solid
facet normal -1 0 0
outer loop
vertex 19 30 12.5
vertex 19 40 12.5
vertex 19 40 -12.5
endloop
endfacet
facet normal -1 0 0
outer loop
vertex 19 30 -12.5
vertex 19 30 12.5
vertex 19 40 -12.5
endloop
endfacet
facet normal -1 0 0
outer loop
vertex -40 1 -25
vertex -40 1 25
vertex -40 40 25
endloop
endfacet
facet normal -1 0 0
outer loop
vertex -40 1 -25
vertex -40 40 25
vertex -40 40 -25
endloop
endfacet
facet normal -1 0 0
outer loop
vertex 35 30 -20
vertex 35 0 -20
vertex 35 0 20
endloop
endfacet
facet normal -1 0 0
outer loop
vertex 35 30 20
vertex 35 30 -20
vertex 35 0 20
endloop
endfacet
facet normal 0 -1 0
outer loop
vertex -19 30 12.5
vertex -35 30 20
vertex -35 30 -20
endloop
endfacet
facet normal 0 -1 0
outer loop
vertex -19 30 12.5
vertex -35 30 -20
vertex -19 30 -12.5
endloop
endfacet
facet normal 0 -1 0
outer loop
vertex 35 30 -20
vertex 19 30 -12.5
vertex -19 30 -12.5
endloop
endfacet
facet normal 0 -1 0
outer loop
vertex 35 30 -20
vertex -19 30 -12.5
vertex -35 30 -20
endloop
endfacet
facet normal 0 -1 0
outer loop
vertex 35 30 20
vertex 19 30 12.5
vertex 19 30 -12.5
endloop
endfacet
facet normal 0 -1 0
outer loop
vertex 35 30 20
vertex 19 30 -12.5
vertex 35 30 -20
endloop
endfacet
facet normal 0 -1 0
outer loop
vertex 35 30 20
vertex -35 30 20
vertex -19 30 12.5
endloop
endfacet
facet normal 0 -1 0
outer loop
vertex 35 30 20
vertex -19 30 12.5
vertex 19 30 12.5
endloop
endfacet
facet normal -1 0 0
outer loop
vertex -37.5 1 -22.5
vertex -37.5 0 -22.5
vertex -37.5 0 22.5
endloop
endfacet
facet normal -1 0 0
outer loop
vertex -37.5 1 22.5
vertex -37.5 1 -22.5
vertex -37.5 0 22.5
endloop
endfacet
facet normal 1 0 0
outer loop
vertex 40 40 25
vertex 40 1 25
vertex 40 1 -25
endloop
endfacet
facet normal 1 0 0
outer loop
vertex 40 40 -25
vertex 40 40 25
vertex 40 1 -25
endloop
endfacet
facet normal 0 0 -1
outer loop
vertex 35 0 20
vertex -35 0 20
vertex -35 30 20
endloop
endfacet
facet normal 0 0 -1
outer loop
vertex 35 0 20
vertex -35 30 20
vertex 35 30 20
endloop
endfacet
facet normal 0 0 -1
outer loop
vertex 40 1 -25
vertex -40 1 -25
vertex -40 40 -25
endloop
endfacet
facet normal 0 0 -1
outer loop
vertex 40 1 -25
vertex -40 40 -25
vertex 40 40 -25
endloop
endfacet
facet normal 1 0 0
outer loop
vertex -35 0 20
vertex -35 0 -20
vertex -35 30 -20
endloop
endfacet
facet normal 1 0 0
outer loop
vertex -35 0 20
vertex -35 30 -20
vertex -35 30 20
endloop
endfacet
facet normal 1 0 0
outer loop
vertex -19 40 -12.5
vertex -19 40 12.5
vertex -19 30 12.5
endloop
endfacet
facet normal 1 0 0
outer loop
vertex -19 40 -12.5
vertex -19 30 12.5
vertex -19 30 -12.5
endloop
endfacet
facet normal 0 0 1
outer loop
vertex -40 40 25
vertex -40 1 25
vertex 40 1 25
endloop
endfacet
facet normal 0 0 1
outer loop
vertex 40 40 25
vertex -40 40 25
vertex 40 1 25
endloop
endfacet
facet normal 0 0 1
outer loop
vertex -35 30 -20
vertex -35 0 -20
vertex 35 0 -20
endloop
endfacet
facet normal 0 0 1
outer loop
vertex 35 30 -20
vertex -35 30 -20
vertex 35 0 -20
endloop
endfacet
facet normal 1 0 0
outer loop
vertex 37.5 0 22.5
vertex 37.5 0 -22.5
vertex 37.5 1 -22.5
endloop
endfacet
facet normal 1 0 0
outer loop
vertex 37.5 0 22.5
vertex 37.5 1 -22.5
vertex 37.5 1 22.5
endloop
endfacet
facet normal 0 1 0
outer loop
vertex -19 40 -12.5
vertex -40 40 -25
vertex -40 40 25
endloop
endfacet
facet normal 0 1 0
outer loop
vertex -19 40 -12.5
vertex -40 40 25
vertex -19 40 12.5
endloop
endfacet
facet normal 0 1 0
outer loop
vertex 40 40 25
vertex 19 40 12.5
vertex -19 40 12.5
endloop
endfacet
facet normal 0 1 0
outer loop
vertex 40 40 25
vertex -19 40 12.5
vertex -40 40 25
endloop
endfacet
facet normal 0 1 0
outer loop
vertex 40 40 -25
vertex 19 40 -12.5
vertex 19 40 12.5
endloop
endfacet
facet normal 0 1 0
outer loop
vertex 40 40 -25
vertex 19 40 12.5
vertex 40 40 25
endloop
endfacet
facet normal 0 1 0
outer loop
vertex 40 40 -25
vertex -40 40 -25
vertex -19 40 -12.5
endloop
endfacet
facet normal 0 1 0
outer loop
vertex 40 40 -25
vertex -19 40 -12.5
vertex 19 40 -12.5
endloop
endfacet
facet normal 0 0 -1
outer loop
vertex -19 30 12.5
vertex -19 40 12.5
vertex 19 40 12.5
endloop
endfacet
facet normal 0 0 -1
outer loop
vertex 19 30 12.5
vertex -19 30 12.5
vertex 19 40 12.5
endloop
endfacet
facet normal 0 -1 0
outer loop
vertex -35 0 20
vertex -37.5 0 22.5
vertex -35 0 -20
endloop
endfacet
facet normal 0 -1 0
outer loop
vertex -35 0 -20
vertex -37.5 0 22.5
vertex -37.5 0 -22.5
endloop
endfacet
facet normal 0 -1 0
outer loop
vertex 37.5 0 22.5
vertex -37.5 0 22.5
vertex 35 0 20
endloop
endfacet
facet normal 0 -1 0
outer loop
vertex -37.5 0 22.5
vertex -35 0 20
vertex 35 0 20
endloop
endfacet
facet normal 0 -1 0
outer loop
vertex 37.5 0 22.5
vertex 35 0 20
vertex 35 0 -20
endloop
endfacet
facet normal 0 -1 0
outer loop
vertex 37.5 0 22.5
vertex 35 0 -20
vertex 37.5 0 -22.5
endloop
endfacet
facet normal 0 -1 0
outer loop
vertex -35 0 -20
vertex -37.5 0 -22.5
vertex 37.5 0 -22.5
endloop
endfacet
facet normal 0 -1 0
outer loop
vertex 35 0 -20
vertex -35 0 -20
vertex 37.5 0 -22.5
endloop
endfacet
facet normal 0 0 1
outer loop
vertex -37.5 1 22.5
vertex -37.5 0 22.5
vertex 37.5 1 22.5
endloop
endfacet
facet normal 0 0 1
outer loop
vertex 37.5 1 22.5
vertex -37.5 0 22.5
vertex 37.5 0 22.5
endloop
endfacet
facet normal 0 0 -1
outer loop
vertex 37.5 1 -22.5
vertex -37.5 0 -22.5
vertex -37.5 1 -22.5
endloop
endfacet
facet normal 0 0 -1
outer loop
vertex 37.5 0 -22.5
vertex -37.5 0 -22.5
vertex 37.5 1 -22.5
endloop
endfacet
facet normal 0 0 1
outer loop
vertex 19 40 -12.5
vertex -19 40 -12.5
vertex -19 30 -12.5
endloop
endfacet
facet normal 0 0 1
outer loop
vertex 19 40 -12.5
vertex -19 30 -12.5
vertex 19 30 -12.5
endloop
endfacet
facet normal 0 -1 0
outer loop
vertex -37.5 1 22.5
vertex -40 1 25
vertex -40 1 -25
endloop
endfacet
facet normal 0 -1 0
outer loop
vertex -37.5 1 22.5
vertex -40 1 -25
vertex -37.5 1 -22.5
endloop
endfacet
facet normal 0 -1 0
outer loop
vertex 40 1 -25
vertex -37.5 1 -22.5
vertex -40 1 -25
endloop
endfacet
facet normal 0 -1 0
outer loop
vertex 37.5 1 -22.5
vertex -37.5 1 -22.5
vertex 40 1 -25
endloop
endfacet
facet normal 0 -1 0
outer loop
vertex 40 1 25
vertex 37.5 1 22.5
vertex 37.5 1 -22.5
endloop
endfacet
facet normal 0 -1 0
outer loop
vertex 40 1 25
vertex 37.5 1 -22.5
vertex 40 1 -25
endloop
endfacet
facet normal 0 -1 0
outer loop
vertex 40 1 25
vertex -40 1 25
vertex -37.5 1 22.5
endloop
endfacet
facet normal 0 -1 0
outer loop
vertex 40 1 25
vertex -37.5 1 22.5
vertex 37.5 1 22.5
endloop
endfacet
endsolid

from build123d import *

# Parameters (mm, degrees)
SKETCH_1_W          = 80
SKETCH_1_H          = 50
EXTRUDE_1_DEPTH     = 40
SKETCH_2_W          = 70
SKETCH_2_H          = 40
CUT_EXTRUDE_1_DEPTH = 30
SKETCH_4_W          = 38
SKETCH_4_H          = 25
CUT_EXTRUDE_2_DEPTH = 30
SKETCH_7_W          = 80
SKETCH_7_H          = 50
SKETCH_7_W_2        = 75
SKETCH_7_H_2        = 45
CUT_EXTRUDE_3_DEPTH = 1


with BuildPart() as part:
    # 스케치1 → 보스-돌출1 (new body)
    with BuildSketch(Plane(origin=(0, 0, 0), x_dir=(1, 0, 0), z_dir=(0, 1, 0))):
        Rectangle(SKETCH_1_W, SKETCH_1_H)
    extrude(amount=EXTRUDE_1_DEPTH)

    # 스케치2 → 컷-돌출1 (cut)
    with BuildSketch(Plane.XZ):
        Rectangle(SKETCH_2_W, SKETCH_2_H)
    extrude(amount=-CUT_EXTRUDE_1_DEPTH, mode=Mode.SUBTRACT)

    # 스케치4 → 컷-돌출2 (cut)
    with BuildSketch(Plane(origin=(0, 40, 0), x_dir=(1, 0, 0), z_dir=(0, 1, 0))):
        Rectangle(SKETCH_4_W, SKETCH_4_H)
    extrude(amount=-CUT_EXTRUDE_2_DEPTH, mode=Mode.SUBTRACT)

    # 스케치7 → 컷-돌출3 (cut)
    with BuildSketch(Plane.XZ):
        Rectangle(SKETCH_7_W, SKETCH_7_H)
        Rectangle(SKETCH_7_W_2, SKETCH_7_H_2, mode=Mode.SUBTRACT)
    extrude(amount=-CUT_EXTRUDE_3_DEPTH, mode=Mode.SUBTRACT)


solid = part.part
